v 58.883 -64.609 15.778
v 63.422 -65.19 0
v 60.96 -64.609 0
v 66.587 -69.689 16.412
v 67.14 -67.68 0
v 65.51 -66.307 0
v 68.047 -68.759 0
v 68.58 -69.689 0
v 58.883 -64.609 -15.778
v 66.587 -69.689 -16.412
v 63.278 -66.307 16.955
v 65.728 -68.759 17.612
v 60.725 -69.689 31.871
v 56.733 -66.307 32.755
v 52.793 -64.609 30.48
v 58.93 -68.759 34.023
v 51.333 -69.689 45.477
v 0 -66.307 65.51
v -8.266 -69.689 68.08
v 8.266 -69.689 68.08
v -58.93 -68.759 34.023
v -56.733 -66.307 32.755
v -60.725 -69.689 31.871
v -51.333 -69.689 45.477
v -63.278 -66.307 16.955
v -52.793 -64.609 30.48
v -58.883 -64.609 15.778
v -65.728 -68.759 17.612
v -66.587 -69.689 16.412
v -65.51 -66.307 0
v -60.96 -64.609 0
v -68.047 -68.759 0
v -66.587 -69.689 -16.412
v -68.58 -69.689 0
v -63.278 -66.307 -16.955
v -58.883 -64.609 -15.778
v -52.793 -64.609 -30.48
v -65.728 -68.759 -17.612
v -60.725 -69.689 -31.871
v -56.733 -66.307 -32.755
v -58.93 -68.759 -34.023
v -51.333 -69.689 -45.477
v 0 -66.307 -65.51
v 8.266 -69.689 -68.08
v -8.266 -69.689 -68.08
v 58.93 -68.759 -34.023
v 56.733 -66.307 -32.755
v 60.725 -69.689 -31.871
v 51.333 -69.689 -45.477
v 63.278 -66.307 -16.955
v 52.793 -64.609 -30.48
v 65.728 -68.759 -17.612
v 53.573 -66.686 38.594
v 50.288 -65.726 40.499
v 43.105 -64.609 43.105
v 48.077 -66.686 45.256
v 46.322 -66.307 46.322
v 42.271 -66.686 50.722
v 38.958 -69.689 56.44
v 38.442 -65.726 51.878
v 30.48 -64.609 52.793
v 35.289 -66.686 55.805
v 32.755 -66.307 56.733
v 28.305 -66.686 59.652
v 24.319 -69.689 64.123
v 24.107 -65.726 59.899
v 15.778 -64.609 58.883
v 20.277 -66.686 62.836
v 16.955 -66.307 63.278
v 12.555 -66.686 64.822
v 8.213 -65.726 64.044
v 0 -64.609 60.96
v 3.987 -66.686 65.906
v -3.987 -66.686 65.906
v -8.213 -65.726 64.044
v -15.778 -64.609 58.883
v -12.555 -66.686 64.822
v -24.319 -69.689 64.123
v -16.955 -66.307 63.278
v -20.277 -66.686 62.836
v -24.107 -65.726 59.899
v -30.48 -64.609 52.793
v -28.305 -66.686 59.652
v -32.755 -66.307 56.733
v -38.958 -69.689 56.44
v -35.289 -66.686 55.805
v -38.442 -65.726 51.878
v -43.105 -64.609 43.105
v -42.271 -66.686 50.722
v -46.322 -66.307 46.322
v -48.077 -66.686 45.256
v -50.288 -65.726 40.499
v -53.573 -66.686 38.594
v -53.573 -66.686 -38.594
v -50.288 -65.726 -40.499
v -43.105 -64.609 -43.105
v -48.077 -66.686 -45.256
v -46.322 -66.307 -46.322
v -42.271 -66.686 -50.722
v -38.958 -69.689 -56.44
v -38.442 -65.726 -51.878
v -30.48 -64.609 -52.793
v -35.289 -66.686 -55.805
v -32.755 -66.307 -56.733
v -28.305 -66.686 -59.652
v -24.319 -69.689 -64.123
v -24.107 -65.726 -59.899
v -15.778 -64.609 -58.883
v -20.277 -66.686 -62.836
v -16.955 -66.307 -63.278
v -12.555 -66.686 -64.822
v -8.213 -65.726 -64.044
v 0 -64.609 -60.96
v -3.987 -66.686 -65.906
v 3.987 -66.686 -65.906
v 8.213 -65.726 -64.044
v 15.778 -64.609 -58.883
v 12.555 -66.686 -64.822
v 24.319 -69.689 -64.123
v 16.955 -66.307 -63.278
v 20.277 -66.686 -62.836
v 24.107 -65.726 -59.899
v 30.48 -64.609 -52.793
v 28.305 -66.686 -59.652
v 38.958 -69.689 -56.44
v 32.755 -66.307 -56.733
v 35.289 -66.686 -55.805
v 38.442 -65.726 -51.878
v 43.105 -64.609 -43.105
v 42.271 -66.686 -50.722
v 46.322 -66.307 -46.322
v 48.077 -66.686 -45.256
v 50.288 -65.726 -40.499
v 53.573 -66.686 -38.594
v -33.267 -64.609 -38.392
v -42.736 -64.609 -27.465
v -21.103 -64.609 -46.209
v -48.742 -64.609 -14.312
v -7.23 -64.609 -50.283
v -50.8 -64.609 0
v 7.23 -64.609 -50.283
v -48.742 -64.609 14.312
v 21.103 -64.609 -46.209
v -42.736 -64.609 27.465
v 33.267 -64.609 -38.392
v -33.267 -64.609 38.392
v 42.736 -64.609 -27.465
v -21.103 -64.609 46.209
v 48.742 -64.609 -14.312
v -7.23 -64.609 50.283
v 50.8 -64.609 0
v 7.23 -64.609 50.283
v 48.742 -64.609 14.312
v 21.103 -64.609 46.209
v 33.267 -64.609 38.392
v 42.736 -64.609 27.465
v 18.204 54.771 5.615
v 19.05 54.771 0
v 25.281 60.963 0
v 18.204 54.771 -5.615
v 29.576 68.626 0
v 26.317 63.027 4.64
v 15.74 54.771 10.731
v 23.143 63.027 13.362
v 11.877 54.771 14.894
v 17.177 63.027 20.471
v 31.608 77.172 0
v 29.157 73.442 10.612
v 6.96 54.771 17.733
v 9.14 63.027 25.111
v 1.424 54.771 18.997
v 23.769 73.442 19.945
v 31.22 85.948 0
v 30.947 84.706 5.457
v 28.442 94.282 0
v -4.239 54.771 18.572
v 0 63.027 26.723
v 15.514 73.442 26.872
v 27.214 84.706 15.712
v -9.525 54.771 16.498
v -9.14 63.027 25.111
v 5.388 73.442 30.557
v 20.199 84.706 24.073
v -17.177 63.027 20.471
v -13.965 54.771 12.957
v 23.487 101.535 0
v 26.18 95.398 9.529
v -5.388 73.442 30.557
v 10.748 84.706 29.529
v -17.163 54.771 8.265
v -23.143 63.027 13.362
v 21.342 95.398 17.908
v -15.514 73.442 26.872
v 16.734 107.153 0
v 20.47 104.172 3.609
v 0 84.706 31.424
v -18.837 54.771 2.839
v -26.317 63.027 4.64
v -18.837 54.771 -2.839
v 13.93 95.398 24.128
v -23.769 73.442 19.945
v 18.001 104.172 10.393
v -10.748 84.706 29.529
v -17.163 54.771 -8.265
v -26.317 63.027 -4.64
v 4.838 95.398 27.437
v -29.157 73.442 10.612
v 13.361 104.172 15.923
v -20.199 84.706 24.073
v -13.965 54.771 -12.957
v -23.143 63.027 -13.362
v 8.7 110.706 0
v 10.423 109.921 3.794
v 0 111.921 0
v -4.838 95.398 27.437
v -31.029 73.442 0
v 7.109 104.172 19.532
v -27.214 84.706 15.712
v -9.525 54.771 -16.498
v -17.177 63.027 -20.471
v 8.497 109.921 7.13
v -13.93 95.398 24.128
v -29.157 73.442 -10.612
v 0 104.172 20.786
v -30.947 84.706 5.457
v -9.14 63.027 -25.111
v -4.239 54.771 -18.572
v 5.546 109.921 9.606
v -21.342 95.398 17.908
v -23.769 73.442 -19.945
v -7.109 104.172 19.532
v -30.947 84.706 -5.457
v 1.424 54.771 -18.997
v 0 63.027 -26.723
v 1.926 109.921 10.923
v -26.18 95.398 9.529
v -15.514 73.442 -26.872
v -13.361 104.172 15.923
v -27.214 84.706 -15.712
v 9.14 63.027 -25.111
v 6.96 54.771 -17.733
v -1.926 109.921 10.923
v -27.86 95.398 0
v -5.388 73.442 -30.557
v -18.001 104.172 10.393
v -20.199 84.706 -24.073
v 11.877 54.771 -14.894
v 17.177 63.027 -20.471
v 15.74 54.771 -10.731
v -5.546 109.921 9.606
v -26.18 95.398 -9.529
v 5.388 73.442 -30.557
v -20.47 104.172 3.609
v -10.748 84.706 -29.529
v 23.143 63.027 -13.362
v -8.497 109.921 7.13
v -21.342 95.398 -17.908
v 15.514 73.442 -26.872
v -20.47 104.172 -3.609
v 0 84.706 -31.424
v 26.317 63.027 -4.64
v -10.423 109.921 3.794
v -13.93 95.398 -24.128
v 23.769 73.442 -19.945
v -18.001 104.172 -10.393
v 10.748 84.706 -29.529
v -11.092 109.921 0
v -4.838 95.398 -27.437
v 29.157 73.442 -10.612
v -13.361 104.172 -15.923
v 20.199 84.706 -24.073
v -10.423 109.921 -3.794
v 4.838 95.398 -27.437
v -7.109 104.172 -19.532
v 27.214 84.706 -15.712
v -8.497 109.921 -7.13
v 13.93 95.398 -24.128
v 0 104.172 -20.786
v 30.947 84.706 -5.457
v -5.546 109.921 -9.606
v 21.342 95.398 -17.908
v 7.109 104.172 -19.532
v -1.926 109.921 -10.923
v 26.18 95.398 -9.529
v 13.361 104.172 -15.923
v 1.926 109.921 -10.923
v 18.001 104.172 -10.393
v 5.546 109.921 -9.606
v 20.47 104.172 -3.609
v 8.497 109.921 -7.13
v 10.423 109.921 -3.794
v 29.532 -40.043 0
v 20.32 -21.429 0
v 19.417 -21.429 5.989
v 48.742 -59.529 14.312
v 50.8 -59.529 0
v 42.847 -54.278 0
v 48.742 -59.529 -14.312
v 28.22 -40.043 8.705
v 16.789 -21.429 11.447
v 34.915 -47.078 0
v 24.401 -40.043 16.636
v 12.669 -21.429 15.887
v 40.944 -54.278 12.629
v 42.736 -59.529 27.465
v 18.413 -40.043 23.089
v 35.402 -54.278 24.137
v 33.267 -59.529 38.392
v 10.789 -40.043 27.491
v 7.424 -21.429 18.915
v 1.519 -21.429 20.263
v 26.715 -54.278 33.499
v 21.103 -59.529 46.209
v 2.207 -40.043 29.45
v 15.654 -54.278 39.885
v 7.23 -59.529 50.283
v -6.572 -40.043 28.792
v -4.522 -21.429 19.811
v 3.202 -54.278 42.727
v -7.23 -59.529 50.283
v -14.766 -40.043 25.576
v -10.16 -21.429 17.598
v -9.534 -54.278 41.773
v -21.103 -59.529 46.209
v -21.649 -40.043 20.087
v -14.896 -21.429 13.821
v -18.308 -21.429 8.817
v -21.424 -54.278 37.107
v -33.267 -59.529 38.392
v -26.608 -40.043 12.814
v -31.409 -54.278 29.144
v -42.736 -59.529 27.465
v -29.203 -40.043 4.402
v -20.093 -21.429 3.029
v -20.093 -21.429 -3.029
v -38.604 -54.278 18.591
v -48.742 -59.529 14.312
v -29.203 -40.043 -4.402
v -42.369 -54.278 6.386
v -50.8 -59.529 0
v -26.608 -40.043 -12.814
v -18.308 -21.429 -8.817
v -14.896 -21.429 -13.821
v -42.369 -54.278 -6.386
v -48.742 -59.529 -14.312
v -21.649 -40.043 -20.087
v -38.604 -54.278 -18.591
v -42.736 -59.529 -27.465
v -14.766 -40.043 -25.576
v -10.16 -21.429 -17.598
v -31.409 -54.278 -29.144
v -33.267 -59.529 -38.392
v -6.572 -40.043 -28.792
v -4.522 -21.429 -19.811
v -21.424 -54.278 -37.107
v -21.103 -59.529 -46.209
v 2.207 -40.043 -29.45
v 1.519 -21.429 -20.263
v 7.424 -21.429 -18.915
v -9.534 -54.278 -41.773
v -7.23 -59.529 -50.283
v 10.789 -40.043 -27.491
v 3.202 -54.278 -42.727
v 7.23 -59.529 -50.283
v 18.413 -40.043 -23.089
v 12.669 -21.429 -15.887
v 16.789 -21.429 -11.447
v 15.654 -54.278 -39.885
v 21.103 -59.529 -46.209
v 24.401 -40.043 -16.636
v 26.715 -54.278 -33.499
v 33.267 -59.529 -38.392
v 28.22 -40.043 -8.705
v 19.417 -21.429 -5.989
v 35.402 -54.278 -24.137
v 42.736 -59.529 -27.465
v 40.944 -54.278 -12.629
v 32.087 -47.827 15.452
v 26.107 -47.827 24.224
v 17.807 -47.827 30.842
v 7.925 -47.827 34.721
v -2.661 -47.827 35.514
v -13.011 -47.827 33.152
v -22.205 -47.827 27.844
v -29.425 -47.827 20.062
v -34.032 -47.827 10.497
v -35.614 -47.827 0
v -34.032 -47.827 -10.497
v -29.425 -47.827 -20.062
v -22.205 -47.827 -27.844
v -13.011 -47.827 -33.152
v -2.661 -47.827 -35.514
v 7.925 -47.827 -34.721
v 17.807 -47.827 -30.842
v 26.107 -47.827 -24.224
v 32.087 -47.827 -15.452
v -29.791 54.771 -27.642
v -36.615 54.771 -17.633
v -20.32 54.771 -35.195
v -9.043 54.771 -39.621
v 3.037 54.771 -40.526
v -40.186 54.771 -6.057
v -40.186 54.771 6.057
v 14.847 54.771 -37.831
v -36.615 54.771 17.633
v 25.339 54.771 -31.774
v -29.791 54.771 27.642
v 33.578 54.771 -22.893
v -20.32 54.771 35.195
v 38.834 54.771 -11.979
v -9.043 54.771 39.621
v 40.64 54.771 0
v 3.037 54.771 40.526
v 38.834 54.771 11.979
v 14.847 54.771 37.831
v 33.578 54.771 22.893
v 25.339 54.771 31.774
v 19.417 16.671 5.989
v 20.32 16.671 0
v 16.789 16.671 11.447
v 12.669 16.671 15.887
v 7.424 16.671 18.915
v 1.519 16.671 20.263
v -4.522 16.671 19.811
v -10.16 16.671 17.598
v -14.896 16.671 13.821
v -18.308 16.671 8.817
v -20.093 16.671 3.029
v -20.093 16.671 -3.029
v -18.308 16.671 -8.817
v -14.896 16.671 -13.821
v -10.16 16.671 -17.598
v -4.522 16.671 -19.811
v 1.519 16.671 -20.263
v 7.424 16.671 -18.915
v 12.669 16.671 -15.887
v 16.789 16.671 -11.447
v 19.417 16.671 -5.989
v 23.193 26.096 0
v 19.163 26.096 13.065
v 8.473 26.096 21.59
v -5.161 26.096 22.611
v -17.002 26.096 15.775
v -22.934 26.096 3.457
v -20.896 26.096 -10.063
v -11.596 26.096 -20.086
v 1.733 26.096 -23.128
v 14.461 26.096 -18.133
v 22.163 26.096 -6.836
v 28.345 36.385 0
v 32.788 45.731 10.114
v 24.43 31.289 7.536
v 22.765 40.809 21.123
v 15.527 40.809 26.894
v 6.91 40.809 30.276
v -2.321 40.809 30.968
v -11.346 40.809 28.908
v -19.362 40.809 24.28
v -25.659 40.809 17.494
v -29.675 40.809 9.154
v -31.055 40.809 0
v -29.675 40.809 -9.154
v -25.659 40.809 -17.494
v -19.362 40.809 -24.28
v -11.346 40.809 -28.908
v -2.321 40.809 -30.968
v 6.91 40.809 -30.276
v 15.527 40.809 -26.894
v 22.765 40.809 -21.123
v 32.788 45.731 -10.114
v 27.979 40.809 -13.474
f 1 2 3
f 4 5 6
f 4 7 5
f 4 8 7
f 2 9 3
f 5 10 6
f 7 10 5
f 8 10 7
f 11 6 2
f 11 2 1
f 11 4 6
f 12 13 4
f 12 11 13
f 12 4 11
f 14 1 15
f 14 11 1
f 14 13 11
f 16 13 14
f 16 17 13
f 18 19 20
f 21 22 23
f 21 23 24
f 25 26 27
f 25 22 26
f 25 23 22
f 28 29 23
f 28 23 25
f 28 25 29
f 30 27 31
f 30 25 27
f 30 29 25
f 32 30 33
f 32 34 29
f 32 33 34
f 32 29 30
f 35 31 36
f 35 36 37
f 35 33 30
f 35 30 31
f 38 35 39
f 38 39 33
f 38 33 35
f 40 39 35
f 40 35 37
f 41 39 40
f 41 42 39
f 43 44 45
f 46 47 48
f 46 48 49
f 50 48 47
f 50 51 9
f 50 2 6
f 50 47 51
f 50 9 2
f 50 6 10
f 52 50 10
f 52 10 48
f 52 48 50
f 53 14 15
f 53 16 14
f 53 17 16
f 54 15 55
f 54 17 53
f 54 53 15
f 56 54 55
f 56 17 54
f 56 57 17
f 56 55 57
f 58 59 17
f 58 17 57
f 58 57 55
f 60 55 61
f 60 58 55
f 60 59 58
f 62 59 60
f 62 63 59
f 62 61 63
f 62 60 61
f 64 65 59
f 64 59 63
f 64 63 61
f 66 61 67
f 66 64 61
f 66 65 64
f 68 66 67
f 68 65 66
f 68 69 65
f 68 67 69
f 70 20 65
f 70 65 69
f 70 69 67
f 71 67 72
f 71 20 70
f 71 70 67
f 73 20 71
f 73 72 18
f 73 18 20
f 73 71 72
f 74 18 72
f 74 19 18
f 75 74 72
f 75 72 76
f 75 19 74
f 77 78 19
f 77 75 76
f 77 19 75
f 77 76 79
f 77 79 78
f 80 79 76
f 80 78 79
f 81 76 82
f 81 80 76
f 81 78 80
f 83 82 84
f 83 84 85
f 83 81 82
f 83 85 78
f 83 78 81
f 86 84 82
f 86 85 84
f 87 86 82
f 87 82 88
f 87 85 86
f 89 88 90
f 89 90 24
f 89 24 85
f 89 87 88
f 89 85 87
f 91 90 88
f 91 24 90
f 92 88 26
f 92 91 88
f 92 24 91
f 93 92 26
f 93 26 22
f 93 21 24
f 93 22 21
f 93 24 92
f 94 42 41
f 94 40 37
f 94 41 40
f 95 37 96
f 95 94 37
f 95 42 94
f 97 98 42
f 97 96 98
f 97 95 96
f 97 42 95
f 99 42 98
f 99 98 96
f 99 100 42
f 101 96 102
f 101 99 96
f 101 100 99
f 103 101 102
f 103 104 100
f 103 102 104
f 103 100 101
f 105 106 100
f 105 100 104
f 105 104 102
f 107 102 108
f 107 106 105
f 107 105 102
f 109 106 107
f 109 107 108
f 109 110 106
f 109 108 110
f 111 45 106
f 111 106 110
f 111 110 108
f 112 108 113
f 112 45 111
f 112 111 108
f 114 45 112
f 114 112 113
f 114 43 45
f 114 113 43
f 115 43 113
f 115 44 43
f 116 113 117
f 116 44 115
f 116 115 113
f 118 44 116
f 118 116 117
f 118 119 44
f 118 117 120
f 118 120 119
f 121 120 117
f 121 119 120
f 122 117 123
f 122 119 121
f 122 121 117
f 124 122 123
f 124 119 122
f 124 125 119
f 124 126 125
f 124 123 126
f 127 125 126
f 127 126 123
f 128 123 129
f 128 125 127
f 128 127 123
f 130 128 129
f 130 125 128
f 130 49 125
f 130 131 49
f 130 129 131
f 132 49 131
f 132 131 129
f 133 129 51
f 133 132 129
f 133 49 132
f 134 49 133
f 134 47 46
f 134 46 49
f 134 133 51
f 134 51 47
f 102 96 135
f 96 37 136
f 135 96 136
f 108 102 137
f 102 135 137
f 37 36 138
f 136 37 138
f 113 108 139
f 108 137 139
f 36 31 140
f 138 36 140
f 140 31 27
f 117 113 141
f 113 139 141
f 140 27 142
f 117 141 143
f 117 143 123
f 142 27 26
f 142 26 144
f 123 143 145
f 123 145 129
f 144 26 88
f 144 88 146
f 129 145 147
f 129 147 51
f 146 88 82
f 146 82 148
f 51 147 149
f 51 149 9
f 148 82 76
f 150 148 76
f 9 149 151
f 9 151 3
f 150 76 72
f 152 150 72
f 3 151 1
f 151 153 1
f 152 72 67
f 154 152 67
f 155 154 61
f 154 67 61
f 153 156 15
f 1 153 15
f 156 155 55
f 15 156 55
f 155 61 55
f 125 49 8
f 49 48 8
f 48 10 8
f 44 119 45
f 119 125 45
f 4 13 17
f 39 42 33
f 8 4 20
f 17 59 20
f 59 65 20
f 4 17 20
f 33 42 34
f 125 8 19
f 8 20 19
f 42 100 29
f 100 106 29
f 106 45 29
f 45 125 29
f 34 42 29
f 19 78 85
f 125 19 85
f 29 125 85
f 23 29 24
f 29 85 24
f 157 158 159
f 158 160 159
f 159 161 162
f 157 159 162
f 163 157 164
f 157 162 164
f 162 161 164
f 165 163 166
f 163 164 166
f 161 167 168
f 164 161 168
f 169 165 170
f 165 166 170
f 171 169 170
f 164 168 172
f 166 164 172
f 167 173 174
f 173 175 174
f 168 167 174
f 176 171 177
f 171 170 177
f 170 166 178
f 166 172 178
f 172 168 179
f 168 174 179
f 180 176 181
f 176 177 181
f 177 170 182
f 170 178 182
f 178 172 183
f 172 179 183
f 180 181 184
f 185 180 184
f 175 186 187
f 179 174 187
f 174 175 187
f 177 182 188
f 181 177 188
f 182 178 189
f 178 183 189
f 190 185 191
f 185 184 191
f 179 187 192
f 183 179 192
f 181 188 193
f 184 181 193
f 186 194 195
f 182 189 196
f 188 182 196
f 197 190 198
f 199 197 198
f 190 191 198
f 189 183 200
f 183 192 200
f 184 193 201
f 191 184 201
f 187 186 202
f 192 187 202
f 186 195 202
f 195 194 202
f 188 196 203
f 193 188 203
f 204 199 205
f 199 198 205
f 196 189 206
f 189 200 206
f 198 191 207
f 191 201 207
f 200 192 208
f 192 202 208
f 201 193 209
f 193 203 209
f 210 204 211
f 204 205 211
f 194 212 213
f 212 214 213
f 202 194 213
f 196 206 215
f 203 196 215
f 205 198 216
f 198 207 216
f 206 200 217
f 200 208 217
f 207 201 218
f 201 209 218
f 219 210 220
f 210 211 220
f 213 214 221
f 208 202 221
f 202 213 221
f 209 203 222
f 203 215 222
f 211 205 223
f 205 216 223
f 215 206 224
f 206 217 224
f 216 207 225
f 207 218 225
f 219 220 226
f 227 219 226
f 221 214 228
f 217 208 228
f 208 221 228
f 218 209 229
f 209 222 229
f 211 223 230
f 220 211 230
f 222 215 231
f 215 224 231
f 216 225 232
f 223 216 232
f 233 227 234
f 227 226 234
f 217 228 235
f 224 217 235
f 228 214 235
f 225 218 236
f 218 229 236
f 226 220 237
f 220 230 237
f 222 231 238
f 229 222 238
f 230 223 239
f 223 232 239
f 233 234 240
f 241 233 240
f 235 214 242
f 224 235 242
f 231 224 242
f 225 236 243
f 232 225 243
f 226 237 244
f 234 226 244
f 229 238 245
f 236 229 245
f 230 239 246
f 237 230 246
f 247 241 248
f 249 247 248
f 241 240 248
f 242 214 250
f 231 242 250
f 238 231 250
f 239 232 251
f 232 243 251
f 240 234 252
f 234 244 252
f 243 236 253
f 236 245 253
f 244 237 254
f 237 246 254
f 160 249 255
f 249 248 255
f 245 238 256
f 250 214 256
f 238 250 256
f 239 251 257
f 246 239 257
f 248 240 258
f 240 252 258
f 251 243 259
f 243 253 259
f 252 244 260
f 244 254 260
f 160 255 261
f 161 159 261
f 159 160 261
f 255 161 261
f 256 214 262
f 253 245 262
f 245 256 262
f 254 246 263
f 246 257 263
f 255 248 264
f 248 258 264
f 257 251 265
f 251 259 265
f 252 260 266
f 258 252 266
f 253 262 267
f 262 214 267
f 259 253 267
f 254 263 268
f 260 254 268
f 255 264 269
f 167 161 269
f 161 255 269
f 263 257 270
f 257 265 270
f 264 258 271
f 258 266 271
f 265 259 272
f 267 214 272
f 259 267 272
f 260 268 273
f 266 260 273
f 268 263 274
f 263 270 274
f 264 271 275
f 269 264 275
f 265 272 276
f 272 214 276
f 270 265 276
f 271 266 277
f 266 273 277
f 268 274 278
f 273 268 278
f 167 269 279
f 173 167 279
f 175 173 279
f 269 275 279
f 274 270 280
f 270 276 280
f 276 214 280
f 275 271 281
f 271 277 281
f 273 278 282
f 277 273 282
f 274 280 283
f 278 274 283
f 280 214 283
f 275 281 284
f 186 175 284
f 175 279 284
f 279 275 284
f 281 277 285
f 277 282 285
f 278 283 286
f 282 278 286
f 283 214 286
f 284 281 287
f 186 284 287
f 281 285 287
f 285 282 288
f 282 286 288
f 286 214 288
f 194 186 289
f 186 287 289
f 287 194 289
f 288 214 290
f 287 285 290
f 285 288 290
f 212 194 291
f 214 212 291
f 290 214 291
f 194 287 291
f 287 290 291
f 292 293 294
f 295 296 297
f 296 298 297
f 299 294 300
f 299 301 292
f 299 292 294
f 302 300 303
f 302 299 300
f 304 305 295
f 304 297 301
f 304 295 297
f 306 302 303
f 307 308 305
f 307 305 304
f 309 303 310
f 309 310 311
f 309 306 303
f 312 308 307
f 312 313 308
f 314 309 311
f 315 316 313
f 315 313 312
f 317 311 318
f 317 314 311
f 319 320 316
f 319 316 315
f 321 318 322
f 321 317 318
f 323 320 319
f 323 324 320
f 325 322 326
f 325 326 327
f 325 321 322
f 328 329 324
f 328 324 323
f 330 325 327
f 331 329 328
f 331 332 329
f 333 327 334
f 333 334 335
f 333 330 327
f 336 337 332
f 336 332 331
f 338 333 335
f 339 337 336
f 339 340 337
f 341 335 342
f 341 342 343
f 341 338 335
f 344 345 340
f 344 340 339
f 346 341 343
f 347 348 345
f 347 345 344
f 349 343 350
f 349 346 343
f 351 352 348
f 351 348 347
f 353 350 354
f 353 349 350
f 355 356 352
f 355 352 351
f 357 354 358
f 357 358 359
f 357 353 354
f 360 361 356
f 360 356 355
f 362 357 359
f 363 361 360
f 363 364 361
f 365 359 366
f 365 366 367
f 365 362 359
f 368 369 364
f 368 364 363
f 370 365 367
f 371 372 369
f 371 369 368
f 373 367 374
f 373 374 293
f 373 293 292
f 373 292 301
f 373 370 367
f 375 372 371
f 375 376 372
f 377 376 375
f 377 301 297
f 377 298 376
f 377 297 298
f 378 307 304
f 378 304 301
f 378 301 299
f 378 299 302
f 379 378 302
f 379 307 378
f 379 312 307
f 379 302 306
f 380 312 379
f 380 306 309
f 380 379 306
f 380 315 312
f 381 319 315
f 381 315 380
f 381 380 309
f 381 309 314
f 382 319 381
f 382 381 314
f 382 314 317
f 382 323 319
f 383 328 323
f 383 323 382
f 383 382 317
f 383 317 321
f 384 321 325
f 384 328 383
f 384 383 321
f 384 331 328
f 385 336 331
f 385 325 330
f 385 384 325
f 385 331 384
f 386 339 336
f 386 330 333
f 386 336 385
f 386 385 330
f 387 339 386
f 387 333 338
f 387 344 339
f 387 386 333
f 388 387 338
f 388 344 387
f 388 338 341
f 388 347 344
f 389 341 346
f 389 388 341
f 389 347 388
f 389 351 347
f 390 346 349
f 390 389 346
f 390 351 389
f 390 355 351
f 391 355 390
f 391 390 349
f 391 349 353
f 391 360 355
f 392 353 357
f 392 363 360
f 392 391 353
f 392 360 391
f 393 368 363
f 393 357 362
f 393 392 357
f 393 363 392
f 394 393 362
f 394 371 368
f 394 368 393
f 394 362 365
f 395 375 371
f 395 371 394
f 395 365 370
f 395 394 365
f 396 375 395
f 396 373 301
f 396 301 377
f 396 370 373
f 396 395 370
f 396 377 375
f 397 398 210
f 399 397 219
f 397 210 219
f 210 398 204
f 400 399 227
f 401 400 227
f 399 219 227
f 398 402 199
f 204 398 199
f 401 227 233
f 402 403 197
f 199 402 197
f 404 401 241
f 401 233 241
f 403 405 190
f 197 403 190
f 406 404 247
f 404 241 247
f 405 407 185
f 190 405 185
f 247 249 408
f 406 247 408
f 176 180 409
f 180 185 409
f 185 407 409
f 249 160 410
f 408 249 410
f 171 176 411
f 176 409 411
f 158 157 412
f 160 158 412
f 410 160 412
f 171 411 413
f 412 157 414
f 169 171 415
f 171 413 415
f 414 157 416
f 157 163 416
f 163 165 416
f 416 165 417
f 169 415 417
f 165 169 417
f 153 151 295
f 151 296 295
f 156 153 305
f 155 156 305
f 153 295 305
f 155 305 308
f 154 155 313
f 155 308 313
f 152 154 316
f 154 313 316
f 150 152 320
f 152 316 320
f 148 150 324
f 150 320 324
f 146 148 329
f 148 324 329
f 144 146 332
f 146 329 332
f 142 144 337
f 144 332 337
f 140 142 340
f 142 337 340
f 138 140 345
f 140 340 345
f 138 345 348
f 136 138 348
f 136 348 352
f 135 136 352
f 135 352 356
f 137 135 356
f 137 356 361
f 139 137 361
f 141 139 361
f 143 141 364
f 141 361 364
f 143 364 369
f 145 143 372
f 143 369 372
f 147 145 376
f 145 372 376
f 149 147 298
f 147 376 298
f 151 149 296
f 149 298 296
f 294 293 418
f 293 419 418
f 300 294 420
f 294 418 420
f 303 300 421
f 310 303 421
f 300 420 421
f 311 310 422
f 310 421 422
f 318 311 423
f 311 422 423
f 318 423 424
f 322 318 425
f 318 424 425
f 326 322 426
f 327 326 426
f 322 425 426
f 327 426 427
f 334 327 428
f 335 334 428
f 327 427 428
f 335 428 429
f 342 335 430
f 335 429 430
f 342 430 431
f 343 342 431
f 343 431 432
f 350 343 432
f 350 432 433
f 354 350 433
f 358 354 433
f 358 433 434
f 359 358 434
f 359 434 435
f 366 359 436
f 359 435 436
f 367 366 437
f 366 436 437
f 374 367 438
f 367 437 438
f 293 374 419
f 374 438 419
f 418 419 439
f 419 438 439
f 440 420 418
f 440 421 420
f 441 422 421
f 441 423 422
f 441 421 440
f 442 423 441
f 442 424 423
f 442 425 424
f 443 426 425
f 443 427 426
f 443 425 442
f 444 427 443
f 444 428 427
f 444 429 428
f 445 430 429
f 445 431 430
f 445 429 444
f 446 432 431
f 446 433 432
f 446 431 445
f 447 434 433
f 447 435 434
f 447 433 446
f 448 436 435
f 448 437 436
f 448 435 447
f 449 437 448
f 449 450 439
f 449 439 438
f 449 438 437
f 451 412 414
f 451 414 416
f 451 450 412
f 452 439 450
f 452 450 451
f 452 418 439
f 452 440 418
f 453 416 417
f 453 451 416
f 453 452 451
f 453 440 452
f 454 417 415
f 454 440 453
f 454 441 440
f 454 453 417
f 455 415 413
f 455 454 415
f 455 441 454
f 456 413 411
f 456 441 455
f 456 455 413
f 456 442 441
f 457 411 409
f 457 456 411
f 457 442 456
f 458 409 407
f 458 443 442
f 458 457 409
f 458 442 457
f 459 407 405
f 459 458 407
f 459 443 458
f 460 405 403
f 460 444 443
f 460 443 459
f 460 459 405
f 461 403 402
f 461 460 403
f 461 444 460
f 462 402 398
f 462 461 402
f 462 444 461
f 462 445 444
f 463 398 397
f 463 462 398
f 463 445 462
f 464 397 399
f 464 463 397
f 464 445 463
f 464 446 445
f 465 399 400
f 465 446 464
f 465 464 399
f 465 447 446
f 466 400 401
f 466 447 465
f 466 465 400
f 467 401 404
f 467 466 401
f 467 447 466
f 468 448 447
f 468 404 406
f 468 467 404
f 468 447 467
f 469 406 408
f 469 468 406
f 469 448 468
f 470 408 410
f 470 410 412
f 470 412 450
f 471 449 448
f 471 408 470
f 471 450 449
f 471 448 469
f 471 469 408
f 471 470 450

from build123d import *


with BuildPart() as f1:
    # F0 (on Top) → F1 (revolve)
    with BuildSketch(Plane.XY):
        with BuildLine():
            Line((40.64, 54.7711955523), (19.05, 54.7711955523))
            ThreePointArc((19.05, 54.7711955523), (30.1206947131, 90.2114271234), (0, 111.9211955523))
            Line((0, 111.9211955523), (0, -69.6888044477))
            Line((0, -69.6888044477), (68.58, -69.6888044477))
            add(Edge.make_bspline(
                [(60.96, -64.6088044477), (63.6417855309, -66.0841173211), (66.1108927654, -67.8864608844), (68.58, -69.6888044477)],
                knots=[0.8150158321, 0.8150158321, 0.8150158321, 0.8150158321, 1, 1, 1, 1], degree=3))
            Line((60.96, -64.6088044477), (50.8, -64.6088044477))
            Line((50.8, -64.6088044477), (50.8, -59.5288044477))
            add(Edge.make_bspline(
                [(20.32, -21.4288044477), (23.9114469199, -29.790276514), (30.8183636705, -45.8707011348), (45.2337782312, -56.4078117468), (50.8, -59.5288044477)],
                knots=[0, 0, 0, 0, 0.3166654052, 0.6089973318, 0.6089973318, 0.6089973318, 0.6089973318], degree=3))
            Line((20.32, -21.4288044477), (20.32, -10.7584101574))
            Line((20.32, -10.7584101574), (20.32, -10.1280333474))
            add(Edge.make_bspline(
                [(20.32, 16.6711955523), (18.2177086424, 5.9343622337), (20.2250450762, -5.4339231678), (20.32, -10.1280333474)],
                knots=[0.3403990237, 0.3403990237, 0.3403990237, 0.3403990237, 0.6085677542, 0.6085677542, 0.6085677542, 0.6085677542], degree=3))
            add(Edge.make_bspline(
                [(40.64, 54.7711955523), (32.2786703904, 42.9112967892), (22.9885360543, 30.2999567207), (20.32, 16.6711955523)],
                knots=[0, 0, 0, 0, 0.3403990237, 0.3403990237, 0.3403990237, 0.3403990237], degree=3))
        make_face()
        with BuildLine():
            Line((20.32, -10.1280333474), (20.32, 16.6711955523))
            add(Edge.make_bspline(
                [(20.32, 16.6711955523), (18.2177086424, 5.9343622337), (20.2250450762, -5.4339231678), (20.32, -10.1280333474)],
                knots=[0.3403990237, 0.3403990237, 0.3403990237, 0.3403990237, 0.6085677542, 0.6085677542, 0.6085677542, 0.6085677542], degree=3))
        make_face()
        with BuildLine():
            add(Edge.make_bspline(
                [(60.96, -64.6088044477), (63.6417855309, -66.0841173211), (66.1108927654, -67.8864608844), (68.58, -69.6888044477)],
                knots=[0.8150158321, 0.8150158321, 0.8150158321, 0.8150158321, 1, 1, 1, 1], degree=3))
            add(Edge.make_bspline(
                [(60.96, -64.6088044477), (64.9565607309, -64.943768084), (67.9345280908, -68.1189996069), (68.58, -69.6888044477)],
                knots=[0, 0, 0, 0, 0.7151272569, 0.7151272569, 0.7151272569, 0.7151272569], degree=3))
        make_face()
    revolve(axis=Axis((0, 21.1161955523, 0), (0, -1, 0)))


solid = f1.part
